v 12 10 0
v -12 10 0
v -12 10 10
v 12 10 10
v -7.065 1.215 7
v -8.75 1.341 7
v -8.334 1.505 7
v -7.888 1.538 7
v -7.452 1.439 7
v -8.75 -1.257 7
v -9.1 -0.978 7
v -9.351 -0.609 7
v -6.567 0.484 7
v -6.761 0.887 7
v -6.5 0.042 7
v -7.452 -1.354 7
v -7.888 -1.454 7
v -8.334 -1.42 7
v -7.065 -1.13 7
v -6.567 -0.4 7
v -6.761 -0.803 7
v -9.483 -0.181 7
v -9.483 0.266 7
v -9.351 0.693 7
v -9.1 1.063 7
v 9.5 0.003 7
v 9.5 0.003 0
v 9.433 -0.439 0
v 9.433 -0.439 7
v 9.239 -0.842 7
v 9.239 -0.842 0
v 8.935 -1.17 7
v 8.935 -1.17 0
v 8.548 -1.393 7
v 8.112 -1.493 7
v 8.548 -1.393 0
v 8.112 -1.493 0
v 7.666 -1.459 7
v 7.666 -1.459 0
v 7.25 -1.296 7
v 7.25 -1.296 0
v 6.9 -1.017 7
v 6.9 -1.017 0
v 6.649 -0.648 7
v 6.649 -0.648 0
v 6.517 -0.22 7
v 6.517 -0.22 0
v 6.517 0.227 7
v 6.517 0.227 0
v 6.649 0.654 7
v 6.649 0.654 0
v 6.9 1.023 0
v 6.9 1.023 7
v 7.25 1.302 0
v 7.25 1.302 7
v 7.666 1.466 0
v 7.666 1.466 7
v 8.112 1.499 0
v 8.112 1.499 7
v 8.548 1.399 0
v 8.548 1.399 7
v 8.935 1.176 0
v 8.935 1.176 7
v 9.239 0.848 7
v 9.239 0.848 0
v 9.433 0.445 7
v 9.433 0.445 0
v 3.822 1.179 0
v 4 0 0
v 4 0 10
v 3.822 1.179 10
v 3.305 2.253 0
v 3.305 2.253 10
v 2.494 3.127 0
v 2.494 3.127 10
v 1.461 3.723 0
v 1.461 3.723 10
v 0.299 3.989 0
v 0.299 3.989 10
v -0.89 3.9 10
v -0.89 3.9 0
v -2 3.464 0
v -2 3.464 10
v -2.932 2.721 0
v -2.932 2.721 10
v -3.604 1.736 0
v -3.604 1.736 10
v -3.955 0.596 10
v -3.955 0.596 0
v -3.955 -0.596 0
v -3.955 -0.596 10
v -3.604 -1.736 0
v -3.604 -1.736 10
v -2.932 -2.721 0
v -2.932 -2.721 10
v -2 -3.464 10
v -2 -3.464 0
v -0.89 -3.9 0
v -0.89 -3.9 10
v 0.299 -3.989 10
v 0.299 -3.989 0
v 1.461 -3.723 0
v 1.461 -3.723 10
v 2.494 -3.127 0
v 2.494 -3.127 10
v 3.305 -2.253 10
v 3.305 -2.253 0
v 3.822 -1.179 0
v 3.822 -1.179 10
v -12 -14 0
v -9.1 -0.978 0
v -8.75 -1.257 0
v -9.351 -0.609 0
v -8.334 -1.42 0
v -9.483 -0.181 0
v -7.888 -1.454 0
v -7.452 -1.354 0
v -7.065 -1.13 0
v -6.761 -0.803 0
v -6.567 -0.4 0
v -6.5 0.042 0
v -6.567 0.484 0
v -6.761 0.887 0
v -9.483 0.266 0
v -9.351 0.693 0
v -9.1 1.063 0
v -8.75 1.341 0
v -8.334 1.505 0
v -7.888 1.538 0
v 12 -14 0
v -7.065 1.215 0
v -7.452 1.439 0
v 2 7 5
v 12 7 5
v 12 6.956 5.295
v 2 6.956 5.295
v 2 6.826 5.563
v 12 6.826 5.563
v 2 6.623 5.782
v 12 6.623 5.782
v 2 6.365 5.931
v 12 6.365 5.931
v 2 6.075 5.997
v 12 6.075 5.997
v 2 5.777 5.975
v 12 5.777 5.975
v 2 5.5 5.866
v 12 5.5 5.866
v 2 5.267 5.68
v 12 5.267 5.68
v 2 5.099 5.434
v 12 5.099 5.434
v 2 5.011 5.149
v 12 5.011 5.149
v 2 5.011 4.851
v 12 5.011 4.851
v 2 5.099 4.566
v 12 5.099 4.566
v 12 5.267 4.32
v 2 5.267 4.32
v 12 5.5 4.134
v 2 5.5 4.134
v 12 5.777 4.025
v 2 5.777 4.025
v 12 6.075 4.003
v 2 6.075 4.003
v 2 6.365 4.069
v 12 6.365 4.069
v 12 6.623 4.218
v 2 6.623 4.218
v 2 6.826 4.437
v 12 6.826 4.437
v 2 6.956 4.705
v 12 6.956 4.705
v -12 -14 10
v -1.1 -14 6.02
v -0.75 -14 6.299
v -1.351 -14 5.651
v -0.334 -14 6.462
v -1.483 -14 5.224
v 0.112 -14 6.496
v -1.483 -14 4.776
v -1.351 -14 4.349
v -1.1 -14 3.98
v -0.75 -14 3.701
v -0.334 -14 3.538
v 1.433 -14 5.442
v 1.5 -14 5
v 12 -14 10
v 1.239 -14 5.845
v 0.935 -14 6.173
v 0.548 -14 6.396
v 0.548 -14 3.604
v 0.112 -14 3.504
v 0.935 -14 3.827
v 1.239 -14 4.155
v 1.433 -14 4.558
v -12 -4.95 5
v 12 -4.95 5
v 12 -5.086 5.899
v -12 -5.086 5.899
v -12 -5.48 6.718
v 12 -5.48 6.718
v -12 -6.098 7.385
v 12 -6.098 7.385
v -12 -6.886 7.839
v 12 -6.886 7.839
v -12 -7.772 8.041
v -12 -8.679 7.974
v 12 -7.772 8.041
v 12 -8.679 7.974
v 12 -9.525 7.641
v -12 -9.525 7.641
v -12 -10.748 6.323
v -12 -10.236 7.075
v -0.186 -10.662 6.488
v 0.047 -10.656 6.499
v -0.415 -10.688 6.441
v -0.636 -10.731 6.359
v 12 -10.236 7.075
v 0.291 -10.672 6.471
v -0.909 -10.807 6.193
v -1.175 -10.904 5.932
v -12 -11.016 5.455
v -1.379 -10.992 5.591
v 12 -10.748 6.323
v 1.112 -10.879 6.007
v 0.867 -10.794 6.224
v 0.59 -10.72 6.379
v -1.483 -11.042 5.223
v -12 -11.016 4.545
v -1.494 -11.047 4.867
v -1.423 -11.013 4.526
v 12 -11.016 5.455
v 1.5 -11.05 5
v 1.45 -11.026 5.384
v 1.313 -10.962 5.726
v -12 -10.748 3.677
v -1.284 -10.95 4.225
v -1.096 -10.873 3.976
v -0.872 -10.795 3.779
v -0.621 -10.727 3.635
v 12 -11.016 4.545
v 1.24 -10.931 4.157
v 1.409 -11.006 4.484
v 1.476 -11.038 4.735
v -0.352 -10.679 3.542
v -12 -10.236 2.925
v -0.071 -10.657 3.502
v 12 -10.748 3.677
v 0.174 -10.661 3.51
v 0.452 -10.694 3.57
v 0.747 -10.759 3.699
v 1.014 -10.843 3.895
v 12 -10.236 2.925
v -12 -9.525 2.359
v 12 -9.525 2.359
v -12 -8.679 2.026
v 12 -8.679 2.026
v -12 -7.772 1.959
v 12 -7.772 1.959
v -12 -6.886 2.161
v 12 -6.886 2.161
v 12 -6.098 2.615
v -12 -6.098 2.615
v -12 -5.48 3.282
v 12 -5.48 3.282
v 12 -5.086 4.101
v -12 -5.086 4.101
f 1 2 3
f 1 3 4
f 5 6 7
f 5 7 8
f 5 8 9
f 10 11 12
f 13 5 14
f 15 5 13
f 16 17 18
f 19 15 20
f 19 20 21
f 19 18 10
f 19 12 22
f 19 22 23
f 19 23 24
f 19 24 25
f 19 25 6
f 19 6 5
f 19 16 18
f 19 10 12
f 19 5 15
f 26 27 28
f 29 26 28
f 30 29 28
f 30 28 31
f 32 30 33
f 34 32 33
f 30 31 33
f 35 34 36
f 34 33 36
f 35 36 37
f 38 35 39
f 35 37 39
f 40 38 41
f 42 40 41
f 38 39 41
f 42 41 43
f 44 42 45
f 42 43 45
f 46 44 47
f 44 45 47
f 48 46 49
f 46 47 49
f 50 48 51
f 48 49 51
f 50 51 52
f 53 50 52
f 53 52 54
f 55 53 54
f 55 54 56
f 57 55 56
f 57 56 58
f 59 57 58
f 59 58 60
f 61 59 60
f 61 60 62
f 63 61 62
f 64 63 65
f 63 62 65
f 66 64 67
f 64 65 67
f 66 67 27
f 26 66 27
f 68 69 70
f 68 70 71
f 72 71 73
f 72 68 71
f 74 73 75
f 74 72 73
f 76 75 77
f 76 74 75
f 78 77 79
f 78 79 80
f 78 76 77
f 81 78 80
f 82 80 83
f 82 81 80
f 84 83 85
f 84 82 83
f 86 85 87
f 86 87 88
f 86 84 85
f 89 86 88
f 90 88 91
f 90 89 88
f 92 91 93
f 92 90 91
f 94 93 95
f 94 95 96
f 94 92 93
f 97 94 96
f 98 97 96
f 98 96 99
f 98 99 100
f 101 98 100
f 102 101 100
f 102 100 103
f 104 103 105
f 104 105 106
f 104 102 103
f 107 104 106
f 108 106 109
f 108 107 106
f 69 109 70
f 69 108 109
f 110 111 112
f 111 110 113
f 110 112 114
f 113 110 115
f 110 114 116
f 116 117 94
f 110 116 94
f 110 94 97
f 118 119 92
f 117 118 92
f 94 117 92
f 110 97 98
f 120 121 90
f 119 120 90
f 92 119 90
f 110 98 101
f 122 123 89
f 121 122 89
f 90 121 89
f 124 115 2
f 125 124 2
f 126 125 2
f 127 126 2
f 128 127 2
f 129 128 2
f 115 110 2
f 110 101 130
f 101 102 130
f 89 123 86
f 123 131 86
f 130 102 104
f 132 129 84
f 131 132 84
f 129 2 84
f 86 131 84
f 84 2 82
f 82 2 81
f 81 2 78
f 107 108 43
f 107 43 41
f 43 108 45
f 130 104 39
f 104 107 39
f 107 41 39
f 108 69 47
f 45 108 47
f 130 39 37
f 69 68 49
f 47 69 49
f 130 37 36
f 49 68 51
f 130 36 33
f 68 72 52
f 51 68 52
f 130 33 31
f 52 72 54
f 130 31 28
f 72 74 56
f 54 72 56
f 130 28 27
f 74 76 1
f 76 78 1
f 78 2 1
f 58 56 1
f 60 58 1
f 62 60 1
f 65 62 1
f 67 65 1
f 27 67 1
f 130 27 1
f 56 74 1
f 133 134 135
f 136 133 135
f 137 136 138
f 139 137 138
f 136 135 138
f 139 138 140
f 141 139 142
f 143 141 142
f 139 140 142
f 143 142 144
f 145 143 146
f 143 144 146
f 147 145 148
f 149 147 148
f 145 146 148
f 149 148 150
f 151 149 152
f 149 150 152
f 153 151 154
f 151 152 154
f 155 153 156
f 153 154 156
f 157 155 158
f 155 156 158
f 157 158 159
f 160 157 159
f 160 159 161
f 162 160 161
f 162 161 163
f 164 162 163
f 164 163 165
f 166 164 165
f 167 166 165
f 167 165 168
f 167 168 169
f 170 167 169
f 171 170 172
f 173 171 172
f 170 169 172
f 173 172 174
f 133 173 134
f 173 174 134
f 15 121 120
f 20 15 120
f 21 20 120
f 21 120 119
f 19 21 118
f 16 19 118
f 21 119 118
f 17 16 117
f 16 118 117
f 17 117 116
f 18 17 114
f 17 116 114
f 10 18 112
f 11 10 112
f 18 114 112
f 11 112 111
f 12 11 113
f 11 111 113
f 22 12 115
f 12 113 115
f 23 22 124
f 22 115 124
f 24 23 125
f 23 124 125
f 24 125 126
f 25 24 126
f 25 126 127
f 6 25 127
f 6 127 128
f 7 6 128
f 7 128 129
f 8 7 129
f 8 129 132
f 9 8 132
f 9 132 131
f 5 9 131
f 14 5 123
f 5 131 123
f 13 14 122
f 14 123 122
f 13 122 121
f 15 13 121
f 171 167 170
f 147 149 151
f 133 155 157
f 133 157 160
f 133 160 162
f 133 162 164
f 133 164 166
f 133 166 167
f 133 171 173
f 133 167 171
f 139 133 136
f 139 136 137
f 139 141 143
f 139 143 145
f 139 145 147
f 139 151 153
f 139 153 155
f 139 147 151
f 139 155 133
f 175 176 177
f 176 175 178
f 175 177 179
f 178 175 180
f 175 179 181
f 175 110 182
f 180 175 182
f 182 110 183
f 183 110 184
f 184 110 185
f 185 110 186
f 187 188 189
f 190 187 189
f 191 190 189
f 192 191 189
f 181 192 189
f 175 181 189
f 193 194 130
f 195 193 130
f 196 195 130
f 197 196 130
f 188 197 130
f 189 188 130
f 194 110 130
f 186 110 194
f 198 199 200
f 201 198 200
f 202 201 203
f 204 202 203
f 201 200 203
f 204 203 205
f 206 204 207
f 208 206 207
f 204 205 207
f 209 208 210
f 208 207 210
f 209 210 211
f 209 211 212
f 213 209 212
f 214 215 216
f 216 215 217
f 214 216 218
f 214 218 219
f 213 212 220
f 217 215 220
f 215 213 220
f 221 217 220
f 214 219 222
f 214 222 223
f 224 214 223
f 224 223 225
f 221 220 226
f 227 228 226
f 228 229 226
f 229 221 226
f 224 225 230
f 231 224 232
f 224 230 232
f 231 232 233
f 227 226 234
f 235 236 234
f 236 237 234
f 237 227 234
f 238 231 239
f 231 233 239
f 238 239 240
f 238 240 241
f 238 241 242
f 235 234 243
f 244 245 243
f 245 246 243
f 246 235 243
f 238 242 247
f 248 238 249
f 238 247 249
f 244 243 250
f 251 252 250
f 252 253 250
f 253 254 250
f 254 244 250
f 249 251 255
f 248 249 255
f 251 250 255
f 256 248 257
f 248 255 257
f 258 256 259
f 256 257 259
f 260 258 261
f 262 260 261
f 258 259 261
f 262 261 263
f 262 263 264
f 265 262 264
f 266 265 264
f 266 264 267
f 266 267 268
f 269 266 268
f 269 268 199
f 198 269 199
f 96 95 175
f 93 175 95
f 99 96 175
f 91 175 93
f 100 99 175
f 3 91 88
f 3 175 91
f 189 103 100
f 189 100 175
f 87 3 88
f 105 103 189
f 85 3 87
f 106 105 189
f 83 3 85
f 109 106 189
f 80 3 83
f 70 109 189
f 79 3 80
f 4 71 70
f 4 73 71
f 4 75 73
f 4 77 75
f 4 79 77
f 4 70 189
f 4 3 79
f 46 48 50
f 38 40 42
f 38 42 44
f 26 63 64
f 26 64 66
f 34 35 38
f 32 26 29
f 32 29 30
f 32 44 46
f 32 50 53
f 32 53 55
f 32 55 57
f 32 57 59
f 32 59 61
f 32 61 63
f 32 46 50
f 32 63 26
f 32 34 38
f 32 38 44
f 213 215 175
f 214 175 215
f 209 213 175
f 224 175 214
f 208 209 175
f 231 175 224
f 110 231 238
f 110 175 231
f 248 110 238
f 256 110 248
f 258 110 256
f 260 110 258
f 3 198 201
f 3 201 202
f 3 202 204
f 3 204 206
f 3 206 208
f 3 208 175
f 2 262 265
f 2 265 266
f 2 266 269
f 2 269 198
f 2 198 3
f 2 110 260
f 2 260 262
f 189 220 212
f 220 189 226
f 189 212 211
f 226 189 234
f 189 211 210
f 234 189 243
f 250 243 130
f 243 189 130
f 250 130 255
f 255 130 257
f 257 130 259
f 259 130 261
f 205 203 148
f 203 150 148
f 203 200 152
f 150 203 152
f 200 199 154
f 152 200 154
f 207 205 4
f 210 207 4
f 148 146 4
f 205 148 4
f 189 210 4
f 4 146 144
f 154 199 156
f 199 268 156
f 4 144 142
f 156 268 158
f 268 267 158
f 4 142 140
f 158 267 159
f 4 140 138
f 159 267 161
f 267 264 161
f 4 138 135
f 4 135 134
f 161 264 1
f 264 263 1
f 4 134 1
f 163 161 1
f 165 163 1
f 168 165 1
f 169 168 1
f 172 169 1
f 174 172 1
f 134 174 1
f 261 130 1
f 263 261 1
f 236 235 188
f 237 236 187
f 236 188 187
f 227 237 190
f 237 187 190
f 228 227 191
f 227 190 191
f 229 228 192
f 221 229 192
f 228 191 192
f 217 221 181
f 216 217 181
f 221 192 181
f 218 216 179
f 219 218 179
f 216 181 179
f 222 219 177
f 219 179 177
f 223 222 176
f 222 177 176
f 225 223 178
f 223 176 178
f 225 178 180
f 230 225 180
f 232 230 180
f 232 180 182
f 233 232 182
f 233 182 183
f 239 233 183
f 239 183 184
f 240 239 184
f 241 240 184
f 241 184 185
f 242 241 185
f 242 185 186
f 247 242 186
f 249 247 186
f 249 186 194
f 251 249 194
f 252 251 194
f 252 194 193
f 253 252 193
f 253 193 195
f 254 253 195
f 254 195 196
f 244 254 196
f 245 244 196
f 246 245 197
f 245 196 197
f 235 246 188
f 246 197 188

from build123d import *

# Parameters (mm, degrees)
SKETCH_W        = 24
SKETCH_H        = 24
SKETCH_R        = 4
PAD_DEPTH       = 10
SKETCH002_R     = 3.05
POCKET_DEPTH    = 24.001
SKETCH003_R     = 1
POCKET001_DEPTH = 10
SKETCH004_R     = 1.5
POCKET002_DEPTH = 7
SKETCH005_R     = 1.5
POCKET003_DEPTH = 5


with BuildPart() as part:
    # Sketch → Pad (new body)
    with BuildSketch(Plane.XY):
        with Locations((0, -2)):
            Rectangle(SKETCH_W, SKETCH_H)
        Circle(SKETCH_R, mode=Mode.SUBTRACT)
    extrude(amount=PAD_DEPTH)

    # Sketch002 → Pocket (cut, through all)
    with BuildSketch(Plane.YZ.offset(12)):
        with Locations((-8, 5)):
            Circle(SKETCH002_R)
    extrude(amount=-POCKET_DEPTH, mode=Mode.SUBTRACT)

    # Sketch003 (on Face3 of Pocket) → Pocket001 (cut)
    with BuildSketch(Plane.YZ.offset(12)):
        with Locations((6, 5)):
            Circle(SKETCH003_R)
    extrude(amount=-POCKET001_DEPTH, mode=Mode.SUBTRACT)

    # Sketch004 (on Face4 of Pocket001) → Pocket002 (cut)
    with BuildSketch(Plane(origin=(0, 0, 0), x_dir=(1, 0, 0), z_dir=(0, 0, -1))):
        with Locations((8, -0.003153)):
            Circle(SKETCH004_R)
        with Locations((-8, -0.04227)):
            Circle(SKETCH004_R)
    extrude(amount=-POCKET002_DEPTH, mode=Mode.SUBTRACT)

    # Sketch005 (on Face6 of Pocket002) → Pocket003 (cut)
    with BuildSketch(Plane.XZ.offset(14)):
        with Locations((0, 5)):
            Circle(SKETCH005_R)
    extrude(amount=-POCKET003_DEPTH, mode=Mode.SUBTRACT)


solid = part.part
